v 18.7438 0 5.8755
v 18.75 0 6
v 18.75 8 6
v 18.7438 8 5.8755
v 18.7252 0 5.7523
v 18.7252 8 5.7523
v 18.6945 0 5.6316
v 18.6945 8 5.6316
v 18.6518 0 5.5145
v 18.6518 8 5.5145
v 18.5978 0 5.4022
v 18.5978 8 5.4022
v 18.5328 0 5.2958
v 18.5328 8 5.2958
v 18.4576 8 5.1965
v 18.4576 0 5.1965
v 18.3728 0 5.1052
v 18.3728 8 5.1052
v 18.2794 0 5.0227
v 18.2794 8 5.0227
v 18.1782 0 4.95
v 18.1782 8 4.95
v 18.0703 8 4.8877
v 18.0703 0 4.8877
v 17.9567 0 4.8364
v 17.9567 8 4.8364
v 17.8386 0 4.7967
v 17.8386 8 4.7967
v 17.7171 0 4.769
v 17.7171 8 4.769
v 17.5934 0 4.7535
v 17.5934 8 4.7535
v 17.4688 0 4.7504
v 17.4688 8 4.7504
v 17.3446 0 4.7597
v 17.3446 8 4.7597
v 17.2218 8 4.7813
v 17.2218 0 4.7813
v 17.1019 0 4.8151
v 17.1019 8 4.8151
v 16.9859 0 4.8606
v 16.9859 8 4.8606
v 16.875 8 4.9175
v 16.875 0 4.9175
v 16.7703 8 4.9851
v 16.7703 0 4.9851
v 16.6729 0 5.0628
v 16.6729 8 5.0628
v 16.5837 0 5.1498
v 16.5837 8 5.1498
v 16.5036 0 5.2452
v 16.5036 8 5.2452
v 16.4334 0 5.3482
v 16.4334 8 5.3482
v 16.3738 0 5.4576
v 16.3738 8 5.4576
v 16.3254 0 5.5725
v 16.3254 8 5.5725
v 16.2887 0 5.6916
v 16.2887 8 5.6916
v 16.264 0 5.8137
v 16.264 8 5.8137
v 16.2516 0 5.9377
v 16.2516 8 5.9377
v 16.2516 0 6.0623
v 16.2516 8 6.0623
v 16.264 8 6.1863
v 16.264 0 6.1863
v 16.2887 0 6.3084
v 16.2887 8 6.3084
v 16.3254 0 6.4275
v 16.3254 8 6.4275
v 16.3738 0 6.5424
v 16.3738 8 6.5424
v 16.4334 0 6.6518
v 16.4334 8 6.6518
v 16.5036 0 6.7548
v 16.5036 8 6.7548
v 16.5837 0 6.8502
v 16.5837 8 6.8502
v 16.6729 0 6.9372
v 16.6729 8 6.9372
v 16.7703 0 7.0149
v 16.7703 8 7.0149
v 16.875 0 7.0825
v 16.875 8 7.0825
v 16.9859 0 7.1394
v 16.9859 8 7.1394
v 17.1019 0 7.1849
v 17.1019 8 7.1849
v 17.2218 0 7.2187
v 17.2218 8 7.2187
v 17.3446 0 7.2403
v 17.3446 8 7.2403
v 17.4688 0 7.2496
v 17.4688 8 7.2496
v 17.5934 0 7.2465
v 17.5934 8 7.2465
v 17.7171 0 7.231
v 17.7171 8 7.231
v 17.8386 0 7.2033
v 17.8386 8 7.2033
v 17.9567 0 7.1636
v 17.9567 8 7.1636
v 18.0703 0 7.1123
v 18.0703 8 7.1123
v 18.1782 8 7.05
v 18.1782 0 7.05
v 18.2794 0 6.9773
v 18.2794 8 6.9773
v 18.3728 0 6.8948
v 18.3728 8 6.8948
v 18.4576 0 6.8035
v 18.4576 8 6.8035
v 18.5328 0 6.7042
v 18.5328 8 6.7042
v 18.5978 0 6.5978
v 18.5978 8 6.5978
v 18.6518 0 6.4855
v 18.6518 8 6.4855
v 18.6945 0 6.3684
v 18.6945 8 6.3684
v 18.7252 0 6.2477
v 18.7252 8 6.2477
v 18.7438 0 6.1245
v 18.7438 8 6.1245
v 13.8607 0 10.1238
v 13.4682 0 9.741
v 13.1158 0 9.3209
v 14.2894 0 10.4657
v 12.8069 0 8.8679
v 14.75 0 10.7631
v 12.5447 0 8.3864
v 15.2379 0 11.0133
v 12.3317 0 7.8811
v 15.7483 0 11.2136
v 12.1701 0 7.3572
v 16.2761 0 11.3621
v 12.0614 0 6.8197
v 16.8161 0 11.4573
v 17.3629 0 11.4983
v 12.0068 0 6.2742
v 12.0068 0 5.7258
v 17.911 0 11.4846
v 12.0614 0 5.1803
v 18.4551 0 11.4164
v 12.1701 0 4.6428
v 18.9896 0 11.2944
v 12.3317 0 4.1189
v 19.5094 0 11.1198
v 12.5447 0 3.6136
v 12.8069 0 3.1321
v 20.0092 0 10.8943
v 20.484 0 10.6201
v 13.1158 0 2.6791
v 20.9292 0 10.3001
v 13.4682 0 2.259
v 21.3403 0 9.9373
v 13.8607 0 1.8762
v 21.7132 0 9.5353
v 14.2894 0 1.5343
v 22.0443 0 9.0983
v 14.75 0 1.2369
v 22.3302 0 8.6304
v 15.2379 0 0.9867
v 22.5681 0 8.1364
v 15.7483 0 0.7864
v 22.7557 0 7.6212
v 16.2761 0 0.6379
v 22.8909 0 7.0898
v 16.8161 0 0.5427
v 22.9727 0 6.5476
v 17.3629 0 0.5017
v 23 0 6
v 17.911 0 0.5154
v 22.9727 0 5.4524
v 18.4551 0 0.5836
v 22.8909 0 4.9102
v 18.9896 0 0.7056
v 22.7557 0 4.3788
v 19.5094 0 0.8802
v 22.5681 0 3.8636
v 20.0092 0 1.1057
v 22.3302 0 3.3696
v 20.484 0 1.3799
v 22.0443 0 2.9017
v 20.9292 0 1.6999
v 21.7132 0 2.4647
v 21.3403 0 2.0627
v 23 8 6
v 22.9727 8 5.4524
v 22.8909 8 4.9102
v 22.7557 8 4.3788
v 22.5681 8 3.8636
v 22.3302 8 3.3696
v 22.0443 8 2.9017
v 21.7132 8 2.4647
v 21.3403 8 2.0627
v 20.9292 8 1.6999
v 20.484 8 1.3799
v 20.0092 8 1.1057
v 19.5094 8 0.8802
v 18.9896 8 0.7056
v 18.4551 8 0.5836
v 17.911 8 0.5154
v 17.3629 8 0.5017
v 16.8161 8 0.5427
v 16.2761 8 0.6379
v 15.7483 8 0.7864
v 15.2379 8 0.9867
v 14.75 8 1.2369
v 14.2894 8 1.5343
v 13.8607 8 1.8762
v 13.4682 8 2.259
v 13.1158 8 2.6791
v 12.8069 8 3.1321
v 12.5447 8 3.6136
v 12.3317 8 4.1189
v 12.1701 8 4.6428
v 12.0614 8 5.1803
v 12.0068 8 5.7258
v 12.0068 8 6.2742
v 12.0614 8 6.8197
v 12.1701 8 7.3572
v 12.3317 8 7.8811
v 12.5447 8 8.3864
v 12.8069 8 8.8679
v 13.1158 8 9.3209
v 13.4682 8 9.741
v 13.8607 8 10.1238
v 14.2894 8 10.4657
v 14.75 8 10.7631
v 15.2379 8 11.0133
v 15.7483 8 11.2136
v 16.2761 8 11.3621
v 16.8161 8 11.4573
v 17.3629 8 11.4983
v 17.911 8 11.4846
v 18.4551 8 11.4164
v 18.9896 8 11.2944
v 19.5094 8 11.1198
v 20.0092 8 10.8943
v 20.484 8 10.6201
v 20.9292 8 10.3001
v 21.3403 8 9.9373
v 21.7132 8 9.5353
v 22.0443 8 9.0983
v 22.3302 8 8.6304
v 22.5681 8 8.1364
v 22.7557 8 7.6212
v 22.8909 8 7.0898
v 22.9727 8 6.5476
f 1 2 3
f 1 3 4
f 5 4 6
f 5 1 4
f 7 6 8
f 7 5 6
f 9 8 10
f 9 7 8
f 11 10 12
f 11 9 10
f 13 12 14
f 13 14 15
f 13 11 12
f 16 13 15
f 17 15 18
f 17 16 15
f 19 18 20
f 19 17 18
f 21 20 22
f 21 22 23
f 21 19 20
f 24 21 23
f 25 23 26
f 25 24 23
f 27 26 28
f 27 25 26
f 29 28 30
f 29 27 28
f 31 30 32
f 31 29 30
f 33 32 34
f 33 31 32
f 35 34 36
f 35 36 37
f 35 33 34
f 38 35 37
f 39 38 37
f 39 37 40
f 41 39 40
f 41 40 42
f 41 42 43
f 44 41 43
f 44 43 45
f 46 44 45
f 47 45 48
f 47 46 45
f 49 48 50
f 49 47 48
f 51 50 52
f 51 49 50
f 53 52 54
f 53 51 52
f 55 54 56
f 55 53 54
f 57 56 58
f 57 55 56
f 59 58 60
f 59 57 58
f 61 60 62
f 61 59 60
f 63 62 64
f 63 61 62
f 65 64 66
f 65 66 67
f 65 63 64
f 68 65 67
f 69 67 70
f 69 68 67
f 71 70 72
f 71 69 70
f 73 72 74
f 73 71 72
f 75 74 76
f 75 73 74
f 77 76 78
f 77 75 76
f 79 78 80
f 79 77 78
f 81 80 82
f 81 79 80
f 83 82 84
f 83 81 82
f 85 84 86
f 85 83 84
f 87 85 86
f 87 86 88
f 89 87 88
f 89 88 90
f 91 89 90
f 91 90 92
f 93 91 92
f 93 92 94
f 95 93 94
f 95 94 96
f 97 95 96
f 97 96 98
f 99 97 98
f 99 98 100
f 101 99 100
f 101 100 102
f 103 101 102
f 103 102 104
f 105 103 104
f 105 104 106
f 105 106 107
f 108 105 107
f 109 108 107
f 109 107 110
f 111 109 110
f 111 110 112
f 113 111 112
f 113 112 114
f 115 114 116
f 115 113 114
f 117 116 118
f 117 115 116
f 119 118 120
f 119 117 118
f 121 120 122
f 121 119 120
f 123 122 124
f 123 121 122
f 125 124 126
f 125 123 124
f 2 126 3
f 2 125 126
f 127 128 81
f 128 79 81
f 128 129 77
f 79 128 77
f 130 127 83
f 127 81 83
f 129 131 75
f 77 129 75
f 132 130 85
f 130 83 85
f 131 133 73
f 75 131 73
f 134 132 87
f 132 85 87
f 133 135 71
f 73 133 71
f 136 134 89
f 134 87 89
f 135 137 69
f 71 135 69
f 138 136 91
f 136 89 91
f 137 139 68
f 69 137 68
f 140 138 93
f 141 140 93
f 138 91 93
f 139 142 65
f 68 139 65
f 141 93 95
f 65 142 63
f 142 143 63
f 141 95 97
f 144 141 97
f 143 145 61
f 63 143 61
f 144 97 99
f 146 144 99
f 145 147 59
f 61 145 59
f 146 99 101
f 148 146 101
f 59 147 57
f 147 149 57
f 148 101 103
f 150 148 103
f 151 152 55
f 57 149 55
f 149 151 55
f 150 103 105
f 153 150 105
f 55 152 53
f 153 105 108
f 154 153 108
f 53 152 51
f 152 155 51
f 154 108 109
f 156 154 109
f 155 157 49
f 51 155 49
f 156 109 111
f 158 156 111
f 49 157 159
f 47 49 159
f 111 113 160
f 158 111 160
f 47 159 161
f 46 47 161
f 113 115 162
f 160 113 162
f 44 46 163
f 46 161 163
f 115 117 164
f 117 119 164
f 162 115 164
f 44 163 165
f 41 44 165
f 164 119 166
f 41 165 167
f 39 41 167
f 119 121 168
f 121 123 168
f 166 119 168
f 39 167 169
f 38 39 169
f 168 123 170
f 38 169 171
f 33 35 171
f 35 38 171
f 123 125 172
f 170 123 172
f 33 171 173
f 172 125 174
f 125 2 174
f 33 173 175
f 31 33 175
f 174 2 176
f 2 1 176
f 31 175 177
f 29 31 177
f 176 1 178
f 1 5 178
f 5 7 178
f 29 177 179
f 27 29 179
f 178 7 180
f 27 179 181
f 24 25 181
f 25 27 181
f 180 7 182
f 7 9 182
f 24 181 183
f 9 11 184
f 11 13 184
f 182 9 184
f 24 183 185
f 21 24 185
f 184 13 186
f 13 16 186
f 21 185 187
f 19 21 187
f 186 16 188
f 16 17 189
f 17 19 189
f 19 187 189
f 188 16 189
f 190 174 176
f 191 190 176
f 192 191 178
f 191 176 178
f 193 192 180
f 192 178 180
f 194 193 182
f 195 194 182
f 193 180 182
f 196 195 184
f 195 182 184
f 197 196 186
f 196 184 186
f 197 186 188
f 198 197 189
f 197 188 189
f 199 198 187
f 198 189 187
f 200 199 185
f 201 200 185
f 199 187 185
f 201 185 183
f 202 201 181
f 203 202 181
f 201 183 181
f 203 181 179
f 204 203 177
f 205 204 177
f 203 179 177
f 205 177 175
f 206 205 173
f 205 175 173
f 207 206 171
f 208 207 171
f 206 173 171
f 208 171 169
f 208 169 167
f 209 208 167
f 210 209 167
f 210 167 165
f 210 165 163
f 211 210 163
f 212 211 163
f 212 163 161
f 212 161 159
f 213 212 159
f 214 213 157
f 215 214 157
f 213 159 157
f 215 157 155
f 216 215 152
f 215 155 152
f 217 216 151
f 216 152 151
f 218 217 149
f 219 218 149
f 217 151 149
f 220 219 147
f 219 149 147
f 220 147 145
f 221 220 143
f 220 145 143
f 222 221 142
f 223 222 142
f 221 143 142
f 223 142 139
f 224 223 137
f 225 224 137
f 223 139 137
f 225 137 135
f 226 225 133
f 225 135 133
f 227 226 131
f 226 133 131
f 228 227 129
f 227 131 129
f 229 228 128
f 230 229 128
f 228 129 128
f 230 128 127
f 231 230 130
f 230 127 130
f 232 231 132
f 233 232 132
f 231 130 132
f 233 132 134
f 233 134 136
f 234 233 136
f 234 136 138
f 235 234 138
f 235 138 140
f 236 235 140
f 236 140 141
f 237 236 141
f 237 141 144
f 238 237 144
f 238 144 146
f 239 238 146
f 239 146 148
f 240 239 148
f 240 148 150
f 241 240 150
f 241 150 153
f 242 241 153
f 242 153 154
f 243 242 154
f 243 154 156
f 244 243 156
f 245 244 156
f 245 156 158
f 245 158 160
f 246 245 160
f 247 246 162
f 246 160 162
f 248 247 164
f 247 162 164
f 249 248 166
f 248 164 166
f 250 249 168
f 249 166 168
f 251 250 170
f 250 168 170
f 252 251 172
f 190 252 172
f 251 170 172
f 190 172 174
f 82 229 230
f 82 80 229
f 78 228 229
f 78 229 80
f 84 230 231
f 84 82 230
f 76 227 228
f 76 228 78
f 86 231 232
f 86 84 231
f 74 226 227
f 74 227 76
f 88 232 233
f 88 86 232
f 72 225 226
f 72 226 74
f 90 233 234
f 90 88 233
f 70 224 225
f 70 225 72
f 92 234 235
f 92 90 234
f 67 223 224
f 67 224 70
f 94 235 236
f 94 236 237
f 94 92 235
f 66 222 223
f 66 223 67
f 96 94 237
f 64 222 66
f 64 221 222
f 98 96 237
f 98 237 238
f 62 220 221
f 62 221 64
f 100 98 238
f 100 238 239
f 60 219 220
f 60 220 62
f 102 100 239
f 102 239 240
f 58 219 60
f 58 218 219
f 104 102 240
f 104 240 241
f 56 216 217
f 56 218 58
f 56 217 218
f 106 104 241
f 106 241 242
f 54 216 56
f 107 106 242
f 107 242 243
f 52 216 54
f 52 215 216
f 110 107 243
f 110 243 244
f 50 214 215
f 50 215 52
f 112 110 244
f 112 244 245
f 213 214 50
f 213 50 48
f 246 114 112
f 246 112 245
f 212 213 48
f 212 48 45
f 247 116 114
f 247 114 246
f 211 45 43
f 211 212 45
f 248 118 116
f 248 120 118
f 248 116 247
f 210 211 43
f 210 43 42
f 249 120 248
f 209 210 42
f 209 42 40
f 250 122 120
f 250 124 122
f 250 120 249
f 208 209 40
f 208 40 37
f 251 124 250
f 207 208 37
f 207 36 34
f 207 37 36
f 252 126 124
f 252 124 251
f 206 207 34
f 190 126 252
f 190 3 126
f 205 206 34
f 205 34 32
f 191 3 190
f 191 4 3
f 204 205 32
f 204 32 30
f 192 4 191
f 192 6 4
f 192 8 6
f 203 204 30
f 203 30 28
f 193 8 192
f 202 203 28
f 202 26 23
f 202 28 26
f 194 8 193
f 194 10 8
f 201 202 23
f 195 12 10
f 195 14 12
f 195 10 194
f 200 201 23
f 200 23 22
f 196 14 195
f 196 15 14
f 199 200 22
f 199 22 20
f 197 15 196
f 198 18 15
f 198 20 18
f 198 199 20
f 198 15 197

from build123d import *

# Parameters (mm, degrees)
CYLINDER003_R          = 1.25
CYLINDER003_DEPTH      = 8
CYLINDER003_ROLL_ANGLE = -90
CYLINDER002_R          = 5.5
CYLINDER002_DEPTH      = 8
CYLINDER002_ROLL_ANGLE = -90


with BuildPart() as m3_tap_hole:
    # Cylinder003 → Cylinder003 (new body)
    with BuildSketch(Plane.XY):
        Circle(CYLINDER003_R)
    extrude(amount=CYLINDER003_DEPTH)


with BuildPart() as m3_tap_hole_1:
    # Cylinder003 roll: moved
    add(m3_tap_hole.part.rotate(Axis((0, 0, 0), (1, 0, 0)), CYLINDER003_ROLL_ANGLE))


with BuildPart() as m3_tap_hole_2:
    # Cylinder003 placement: moved
    add(m3_tap_hole_1.part.moved(Location((17.5, 0, 6))))


with BuildPart() as m3_support_and_tap_hole:
    # Cylinder002 → Cylinder002 (new body)
    with BuildSketch(Plane.XY):
        Circle(CYLINDER002_R)
    extrude(amount=CYLINDER002_DEPTH)


with BuildPart() as m3_support_and_tap_hole_1:
    # Cylinder002 roll: moved
    add(m3_support_and_tap_hole.part.rotate(Axis((0, 0, 0), (1, 0, 0)), CYLINDER002_ROLL_ANGLE))


with BuildPart() as m3_support_and_tap_hole_2:
    # Cylinder002 placement: moved
    add(m3_support_and_tap_hole_1.part.moved(Location((17.5, 0, 6))))

    # Cut001: cut M3_tap_hole
    add(m3_tap_hole_2.part, mode=Mode.SUBTRACT)


solid = m3_support_and_tap_hole_2.part
